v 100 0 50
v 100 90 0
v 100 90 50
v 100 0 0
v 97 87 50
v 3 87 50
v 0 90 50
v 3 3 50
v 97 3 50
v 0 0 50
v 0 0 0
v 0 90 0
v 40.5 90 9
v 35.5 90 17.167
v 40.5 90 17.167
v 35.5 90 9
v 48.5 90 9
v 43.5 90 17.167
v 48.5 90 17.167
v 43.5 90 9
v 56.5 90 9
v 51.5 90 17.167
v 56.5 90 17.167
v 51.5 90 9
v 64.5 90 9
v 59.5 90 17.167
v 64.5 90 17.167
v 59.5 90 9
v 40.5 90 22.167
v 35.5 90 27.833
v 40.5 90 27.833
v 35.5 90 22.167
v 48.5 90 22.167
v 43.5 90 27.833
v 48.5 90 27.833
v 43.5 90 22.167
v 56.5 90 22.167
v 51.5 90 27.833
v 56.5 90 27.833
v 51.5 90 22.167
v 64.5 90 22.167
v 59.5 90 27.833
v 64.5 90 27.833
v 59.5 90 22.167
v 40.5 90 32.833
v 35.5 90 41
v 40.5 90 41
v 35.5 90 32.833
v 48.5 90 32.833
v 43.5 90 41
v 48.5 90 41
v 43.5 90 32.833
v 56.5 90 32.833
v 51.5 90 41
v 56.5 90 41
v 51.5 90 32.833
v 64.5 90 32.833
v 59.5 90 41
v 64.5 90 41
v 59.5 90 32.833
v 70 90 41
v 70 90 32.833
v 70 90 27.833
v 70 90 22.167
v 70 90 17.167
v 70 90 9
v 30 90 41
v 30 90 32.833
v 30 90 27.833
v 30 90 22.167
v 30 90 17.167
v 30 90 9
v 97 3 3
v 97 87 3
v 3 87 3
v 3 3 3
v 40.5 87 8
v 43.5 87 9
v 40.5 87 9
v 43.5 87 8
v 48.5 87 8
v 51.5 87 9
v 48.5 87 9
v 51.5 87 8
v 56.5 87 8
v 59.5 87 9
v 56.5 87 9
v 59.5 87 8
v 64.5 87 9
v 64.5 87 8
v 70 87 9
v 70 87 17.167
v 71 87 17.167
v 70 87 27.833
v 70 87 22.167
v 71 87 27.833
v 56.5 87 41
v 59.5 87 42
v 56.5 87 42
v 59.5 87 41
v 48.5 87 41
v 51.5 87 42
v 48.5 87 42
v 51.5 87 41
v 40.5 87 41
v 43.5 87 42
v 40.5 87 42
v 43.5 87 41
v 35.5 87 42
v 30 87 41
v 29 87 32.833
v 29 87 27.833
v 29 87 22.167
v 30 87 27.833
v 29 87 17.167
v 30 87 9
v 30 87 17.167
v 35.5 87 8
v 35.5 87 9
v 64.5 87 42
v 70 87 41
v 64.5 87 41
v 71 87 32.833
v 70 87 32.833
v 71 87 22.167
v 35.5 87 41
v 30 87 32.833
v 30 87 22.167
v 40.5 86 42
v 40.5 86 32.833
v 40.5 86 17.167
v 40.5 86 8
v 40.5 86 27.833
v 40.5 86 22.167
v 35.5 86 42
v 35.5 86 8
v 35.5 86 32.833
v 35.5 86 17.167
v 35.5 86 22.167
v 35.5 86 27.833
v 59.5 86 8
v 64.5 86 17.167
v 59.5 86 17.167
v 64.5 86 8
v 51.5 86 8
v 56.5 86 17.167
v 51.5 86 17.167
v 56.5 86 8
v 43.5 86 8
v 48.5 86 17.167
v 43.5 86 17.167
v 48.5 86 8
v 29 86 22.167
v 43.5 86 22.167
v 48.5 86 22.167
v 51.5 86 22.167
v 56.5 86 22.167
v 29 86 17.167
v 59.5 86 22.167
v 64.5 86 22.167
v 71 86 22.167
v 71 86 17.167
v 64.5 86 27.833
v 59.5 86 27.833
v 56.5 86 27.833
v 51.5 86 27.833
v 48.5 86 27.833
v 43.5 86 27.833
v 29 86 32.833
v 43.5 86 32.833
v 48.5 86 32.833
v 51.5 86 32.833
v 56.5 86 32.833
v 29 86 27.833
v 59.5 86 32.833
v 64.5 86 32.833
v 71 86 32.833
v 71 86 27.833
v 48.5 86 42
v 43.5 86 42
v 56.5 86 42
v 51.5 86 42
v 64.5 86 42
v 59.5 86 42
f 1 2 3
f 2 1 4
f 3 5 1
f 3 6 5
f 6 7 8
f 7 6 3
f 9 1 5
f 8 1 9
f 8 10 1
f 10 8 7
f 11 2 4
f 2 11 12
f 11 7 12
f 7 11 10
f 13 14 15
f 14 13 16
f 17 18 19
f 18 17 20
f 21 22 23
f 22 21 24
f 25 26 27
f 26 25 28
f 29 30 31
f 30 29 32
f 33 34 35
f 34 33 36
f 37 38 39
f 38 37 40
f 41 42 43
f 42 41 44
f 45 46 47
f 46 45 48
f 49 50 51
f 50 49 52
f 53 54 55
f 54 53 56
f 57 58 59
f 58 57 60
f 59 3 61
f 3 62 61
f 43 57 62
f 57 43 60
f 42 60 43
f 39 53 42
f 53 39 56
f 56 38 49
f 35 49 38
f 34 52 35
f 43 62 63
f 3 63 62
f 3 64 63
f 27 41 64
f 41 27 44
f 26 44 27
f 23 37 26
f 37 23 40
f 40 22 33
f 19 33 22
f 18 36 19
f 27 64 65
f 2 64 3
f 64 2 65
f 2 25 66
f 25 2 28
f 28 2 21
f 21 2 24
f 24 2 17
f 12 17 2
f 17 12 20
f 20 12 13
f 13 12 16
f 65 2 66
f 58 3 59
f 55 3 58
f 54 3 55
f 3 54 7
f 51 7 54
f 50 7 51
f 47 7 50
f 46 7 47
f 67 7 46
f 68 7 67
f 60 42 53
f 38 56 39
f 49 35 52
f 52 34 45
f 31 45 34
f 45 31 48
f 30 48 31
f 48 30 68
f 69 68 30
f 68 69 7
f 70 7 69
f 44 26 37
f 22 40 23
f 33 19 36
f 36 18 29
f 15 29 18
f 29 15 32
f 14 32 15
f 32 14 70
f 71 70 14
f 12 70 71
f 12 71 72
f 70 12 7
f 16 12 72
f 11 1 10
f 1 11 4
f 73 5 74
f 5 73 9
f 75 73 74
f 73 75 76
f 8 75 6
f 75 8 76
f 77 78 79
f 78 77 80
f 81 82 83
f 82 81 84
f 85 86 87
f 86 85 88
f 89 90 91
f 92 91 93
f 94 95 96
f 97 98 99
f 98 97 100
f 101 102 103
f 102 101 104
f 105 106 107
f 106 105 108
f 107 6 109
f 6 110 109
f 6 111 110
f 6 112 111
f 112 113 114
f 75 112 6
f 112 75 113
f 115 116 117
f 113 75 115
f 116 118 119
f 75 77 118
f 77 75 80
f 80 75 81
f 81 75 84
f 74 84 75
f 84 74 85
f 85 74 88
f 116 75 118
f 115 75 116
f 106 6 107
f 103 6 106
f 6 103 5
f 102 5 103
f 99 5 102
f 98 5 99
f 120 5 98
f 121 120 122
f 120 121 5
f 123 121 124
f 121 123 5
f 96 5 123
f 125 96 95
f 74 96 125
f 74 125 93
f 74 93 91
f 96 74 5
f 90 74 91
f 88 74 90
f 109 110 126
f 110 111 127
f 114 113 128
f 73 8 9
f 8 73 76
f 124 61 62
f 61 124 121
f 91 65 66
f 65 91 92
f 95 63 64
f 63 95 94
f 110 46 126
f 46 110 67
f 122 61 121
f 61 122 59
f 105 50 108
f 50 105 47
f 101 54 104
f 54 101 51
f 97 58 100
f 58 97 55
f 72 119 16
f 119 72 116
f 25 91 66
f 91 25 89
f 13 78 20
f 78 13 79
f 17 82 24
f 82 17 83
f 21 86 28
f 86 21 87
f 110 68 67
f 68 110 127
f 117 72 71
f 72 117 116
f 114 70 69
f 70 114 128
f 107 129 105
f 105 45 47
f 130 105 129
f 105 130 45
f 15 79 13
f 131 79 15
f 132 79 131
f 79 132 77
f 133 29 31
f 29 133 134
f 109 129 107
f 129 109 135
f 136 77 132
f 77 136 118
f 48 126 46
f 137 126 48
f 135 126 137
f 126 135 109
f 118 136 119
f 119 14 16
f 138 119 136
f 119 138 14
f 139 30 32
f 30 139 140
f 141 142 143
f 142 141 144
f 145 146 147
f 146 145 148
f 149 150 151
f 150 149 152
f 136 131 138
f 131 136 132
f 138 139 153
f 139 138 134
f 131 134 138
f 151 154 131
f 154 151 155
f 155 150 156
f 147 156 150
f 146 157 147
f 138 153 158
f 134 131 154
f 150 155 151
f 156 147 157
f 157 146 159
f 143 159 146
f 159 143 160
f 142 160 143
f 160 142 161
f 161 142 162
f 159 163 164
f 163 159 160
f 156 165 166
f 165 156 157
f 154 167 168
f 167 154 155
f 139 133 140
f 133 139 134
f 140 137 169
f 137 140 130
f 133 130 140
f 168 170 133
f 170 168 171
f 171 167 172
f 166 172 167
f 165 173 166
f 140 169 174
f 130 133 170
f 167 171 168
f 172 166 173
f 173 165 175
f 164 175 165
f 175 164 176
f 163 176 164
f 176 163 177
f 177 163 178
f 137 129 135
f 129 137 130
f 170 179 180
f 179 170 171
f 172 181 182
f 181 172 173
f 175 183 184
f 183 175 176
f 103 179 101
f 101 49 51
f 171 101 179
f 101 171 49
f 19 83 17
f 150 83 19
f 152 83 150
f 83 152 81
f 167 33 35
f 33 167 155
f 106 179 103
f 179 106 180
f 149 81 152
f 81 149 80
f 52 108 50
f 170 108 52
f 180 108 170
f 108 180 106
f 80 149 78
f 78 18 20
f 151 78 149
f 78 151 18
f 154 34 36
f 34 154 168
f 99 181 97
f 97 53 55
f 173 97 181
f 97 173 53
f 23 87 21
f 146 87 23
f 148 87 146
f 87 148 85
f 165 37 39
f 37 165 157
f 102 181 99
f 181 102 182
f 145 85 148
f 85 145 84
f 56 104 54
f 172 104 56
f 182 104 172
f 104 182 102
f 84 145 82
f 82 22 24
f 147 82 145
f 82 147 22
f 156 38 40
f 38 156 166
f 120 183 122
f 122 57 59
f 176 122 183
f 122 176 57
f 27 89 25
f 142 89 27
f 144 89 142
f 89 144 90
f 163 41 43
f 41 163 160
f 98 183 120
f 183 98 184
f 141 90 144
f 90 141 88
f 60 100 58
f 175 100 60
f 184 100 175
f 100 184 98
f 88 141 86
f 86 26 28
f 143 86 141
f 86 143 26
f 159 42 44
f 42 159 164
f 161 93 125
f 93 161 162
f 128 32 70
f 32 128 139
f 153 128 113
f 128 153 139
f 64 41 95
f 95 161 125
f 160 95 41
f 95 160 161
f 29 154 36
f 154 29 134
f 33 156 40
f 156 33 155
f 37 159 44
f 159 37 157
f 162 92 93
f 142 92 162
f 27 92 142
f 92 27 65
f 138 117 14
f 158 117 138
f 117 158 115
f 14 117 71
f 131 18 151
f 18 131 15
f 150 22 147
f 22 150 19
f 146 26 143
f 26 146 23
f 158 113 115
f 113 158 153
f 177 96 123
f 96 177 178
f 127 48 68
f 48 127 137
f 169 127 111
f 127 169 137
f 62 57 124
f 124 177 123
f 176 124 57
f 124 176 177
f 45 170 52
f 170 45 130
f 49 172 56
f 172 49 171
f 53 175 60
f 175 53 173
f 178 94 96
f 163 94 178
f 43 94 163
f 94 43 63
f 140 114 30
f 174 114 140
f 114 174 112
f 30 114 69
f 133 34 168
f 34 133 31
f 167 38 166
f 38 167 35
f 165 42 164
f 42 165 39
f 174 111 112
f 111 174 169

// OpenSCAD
$fn = 32;

// ----------------------------------------------------------------------
// Vent box: crossgrid enclosure
// ----------------------------------------------------------------------

// --- parameters (mm) ---
box_l = 100;              // box length, X
box_w = 90;               // box width, Y
box_h = 50;               // box height, Z
wall_t = 3;               // shell wall thickness
win_l = 40;               // vent window width, X
win_h = 32;               // vent window height, Z
bar_w = 5;                // grid bar width
n_v = 4;                  // vertical bar count
n_h = 2;                  // horizontal bar count

win_z0 = (box_h - win_h) / 2;  // window lower edge Z
v_step = win_l / (n_v + 1);  // vertical bar step
h_step = win_h / (n_h + 1);  // horizontal bar step

difference() {
  union() {
    difference() {
      cube([box_l, box_w, box_h]);
  translate([wall_t, wall_t, wall_t])
    cube([box_l - 2 * wall_t, box_w - 2 * wall_t, box_h]);
  translate([(box_l - win_l) / 2, box_w - wall_t - 1, win_z0])
    cube([win_l, wall_t + 2, win_h]);
    }
    for (i = [1 : n_v])
      translate([(box_l - win_l) / 2 + i * v_step - bar_w / 2,
                 box_w - wall_t - 1, win_z0 - 1])
        cube([bar_w, wall_t + 1, win_h + 2]);
    for (i = [1 : n_h])
      translate([(box_l - win_l) / 2 - 1, box_w - wall_t - 1,
                 win_z0 + i * h_step - bar_w / 2])
        cube([win_l + 2, wall_t + 1, bar_w]);
  }
}
